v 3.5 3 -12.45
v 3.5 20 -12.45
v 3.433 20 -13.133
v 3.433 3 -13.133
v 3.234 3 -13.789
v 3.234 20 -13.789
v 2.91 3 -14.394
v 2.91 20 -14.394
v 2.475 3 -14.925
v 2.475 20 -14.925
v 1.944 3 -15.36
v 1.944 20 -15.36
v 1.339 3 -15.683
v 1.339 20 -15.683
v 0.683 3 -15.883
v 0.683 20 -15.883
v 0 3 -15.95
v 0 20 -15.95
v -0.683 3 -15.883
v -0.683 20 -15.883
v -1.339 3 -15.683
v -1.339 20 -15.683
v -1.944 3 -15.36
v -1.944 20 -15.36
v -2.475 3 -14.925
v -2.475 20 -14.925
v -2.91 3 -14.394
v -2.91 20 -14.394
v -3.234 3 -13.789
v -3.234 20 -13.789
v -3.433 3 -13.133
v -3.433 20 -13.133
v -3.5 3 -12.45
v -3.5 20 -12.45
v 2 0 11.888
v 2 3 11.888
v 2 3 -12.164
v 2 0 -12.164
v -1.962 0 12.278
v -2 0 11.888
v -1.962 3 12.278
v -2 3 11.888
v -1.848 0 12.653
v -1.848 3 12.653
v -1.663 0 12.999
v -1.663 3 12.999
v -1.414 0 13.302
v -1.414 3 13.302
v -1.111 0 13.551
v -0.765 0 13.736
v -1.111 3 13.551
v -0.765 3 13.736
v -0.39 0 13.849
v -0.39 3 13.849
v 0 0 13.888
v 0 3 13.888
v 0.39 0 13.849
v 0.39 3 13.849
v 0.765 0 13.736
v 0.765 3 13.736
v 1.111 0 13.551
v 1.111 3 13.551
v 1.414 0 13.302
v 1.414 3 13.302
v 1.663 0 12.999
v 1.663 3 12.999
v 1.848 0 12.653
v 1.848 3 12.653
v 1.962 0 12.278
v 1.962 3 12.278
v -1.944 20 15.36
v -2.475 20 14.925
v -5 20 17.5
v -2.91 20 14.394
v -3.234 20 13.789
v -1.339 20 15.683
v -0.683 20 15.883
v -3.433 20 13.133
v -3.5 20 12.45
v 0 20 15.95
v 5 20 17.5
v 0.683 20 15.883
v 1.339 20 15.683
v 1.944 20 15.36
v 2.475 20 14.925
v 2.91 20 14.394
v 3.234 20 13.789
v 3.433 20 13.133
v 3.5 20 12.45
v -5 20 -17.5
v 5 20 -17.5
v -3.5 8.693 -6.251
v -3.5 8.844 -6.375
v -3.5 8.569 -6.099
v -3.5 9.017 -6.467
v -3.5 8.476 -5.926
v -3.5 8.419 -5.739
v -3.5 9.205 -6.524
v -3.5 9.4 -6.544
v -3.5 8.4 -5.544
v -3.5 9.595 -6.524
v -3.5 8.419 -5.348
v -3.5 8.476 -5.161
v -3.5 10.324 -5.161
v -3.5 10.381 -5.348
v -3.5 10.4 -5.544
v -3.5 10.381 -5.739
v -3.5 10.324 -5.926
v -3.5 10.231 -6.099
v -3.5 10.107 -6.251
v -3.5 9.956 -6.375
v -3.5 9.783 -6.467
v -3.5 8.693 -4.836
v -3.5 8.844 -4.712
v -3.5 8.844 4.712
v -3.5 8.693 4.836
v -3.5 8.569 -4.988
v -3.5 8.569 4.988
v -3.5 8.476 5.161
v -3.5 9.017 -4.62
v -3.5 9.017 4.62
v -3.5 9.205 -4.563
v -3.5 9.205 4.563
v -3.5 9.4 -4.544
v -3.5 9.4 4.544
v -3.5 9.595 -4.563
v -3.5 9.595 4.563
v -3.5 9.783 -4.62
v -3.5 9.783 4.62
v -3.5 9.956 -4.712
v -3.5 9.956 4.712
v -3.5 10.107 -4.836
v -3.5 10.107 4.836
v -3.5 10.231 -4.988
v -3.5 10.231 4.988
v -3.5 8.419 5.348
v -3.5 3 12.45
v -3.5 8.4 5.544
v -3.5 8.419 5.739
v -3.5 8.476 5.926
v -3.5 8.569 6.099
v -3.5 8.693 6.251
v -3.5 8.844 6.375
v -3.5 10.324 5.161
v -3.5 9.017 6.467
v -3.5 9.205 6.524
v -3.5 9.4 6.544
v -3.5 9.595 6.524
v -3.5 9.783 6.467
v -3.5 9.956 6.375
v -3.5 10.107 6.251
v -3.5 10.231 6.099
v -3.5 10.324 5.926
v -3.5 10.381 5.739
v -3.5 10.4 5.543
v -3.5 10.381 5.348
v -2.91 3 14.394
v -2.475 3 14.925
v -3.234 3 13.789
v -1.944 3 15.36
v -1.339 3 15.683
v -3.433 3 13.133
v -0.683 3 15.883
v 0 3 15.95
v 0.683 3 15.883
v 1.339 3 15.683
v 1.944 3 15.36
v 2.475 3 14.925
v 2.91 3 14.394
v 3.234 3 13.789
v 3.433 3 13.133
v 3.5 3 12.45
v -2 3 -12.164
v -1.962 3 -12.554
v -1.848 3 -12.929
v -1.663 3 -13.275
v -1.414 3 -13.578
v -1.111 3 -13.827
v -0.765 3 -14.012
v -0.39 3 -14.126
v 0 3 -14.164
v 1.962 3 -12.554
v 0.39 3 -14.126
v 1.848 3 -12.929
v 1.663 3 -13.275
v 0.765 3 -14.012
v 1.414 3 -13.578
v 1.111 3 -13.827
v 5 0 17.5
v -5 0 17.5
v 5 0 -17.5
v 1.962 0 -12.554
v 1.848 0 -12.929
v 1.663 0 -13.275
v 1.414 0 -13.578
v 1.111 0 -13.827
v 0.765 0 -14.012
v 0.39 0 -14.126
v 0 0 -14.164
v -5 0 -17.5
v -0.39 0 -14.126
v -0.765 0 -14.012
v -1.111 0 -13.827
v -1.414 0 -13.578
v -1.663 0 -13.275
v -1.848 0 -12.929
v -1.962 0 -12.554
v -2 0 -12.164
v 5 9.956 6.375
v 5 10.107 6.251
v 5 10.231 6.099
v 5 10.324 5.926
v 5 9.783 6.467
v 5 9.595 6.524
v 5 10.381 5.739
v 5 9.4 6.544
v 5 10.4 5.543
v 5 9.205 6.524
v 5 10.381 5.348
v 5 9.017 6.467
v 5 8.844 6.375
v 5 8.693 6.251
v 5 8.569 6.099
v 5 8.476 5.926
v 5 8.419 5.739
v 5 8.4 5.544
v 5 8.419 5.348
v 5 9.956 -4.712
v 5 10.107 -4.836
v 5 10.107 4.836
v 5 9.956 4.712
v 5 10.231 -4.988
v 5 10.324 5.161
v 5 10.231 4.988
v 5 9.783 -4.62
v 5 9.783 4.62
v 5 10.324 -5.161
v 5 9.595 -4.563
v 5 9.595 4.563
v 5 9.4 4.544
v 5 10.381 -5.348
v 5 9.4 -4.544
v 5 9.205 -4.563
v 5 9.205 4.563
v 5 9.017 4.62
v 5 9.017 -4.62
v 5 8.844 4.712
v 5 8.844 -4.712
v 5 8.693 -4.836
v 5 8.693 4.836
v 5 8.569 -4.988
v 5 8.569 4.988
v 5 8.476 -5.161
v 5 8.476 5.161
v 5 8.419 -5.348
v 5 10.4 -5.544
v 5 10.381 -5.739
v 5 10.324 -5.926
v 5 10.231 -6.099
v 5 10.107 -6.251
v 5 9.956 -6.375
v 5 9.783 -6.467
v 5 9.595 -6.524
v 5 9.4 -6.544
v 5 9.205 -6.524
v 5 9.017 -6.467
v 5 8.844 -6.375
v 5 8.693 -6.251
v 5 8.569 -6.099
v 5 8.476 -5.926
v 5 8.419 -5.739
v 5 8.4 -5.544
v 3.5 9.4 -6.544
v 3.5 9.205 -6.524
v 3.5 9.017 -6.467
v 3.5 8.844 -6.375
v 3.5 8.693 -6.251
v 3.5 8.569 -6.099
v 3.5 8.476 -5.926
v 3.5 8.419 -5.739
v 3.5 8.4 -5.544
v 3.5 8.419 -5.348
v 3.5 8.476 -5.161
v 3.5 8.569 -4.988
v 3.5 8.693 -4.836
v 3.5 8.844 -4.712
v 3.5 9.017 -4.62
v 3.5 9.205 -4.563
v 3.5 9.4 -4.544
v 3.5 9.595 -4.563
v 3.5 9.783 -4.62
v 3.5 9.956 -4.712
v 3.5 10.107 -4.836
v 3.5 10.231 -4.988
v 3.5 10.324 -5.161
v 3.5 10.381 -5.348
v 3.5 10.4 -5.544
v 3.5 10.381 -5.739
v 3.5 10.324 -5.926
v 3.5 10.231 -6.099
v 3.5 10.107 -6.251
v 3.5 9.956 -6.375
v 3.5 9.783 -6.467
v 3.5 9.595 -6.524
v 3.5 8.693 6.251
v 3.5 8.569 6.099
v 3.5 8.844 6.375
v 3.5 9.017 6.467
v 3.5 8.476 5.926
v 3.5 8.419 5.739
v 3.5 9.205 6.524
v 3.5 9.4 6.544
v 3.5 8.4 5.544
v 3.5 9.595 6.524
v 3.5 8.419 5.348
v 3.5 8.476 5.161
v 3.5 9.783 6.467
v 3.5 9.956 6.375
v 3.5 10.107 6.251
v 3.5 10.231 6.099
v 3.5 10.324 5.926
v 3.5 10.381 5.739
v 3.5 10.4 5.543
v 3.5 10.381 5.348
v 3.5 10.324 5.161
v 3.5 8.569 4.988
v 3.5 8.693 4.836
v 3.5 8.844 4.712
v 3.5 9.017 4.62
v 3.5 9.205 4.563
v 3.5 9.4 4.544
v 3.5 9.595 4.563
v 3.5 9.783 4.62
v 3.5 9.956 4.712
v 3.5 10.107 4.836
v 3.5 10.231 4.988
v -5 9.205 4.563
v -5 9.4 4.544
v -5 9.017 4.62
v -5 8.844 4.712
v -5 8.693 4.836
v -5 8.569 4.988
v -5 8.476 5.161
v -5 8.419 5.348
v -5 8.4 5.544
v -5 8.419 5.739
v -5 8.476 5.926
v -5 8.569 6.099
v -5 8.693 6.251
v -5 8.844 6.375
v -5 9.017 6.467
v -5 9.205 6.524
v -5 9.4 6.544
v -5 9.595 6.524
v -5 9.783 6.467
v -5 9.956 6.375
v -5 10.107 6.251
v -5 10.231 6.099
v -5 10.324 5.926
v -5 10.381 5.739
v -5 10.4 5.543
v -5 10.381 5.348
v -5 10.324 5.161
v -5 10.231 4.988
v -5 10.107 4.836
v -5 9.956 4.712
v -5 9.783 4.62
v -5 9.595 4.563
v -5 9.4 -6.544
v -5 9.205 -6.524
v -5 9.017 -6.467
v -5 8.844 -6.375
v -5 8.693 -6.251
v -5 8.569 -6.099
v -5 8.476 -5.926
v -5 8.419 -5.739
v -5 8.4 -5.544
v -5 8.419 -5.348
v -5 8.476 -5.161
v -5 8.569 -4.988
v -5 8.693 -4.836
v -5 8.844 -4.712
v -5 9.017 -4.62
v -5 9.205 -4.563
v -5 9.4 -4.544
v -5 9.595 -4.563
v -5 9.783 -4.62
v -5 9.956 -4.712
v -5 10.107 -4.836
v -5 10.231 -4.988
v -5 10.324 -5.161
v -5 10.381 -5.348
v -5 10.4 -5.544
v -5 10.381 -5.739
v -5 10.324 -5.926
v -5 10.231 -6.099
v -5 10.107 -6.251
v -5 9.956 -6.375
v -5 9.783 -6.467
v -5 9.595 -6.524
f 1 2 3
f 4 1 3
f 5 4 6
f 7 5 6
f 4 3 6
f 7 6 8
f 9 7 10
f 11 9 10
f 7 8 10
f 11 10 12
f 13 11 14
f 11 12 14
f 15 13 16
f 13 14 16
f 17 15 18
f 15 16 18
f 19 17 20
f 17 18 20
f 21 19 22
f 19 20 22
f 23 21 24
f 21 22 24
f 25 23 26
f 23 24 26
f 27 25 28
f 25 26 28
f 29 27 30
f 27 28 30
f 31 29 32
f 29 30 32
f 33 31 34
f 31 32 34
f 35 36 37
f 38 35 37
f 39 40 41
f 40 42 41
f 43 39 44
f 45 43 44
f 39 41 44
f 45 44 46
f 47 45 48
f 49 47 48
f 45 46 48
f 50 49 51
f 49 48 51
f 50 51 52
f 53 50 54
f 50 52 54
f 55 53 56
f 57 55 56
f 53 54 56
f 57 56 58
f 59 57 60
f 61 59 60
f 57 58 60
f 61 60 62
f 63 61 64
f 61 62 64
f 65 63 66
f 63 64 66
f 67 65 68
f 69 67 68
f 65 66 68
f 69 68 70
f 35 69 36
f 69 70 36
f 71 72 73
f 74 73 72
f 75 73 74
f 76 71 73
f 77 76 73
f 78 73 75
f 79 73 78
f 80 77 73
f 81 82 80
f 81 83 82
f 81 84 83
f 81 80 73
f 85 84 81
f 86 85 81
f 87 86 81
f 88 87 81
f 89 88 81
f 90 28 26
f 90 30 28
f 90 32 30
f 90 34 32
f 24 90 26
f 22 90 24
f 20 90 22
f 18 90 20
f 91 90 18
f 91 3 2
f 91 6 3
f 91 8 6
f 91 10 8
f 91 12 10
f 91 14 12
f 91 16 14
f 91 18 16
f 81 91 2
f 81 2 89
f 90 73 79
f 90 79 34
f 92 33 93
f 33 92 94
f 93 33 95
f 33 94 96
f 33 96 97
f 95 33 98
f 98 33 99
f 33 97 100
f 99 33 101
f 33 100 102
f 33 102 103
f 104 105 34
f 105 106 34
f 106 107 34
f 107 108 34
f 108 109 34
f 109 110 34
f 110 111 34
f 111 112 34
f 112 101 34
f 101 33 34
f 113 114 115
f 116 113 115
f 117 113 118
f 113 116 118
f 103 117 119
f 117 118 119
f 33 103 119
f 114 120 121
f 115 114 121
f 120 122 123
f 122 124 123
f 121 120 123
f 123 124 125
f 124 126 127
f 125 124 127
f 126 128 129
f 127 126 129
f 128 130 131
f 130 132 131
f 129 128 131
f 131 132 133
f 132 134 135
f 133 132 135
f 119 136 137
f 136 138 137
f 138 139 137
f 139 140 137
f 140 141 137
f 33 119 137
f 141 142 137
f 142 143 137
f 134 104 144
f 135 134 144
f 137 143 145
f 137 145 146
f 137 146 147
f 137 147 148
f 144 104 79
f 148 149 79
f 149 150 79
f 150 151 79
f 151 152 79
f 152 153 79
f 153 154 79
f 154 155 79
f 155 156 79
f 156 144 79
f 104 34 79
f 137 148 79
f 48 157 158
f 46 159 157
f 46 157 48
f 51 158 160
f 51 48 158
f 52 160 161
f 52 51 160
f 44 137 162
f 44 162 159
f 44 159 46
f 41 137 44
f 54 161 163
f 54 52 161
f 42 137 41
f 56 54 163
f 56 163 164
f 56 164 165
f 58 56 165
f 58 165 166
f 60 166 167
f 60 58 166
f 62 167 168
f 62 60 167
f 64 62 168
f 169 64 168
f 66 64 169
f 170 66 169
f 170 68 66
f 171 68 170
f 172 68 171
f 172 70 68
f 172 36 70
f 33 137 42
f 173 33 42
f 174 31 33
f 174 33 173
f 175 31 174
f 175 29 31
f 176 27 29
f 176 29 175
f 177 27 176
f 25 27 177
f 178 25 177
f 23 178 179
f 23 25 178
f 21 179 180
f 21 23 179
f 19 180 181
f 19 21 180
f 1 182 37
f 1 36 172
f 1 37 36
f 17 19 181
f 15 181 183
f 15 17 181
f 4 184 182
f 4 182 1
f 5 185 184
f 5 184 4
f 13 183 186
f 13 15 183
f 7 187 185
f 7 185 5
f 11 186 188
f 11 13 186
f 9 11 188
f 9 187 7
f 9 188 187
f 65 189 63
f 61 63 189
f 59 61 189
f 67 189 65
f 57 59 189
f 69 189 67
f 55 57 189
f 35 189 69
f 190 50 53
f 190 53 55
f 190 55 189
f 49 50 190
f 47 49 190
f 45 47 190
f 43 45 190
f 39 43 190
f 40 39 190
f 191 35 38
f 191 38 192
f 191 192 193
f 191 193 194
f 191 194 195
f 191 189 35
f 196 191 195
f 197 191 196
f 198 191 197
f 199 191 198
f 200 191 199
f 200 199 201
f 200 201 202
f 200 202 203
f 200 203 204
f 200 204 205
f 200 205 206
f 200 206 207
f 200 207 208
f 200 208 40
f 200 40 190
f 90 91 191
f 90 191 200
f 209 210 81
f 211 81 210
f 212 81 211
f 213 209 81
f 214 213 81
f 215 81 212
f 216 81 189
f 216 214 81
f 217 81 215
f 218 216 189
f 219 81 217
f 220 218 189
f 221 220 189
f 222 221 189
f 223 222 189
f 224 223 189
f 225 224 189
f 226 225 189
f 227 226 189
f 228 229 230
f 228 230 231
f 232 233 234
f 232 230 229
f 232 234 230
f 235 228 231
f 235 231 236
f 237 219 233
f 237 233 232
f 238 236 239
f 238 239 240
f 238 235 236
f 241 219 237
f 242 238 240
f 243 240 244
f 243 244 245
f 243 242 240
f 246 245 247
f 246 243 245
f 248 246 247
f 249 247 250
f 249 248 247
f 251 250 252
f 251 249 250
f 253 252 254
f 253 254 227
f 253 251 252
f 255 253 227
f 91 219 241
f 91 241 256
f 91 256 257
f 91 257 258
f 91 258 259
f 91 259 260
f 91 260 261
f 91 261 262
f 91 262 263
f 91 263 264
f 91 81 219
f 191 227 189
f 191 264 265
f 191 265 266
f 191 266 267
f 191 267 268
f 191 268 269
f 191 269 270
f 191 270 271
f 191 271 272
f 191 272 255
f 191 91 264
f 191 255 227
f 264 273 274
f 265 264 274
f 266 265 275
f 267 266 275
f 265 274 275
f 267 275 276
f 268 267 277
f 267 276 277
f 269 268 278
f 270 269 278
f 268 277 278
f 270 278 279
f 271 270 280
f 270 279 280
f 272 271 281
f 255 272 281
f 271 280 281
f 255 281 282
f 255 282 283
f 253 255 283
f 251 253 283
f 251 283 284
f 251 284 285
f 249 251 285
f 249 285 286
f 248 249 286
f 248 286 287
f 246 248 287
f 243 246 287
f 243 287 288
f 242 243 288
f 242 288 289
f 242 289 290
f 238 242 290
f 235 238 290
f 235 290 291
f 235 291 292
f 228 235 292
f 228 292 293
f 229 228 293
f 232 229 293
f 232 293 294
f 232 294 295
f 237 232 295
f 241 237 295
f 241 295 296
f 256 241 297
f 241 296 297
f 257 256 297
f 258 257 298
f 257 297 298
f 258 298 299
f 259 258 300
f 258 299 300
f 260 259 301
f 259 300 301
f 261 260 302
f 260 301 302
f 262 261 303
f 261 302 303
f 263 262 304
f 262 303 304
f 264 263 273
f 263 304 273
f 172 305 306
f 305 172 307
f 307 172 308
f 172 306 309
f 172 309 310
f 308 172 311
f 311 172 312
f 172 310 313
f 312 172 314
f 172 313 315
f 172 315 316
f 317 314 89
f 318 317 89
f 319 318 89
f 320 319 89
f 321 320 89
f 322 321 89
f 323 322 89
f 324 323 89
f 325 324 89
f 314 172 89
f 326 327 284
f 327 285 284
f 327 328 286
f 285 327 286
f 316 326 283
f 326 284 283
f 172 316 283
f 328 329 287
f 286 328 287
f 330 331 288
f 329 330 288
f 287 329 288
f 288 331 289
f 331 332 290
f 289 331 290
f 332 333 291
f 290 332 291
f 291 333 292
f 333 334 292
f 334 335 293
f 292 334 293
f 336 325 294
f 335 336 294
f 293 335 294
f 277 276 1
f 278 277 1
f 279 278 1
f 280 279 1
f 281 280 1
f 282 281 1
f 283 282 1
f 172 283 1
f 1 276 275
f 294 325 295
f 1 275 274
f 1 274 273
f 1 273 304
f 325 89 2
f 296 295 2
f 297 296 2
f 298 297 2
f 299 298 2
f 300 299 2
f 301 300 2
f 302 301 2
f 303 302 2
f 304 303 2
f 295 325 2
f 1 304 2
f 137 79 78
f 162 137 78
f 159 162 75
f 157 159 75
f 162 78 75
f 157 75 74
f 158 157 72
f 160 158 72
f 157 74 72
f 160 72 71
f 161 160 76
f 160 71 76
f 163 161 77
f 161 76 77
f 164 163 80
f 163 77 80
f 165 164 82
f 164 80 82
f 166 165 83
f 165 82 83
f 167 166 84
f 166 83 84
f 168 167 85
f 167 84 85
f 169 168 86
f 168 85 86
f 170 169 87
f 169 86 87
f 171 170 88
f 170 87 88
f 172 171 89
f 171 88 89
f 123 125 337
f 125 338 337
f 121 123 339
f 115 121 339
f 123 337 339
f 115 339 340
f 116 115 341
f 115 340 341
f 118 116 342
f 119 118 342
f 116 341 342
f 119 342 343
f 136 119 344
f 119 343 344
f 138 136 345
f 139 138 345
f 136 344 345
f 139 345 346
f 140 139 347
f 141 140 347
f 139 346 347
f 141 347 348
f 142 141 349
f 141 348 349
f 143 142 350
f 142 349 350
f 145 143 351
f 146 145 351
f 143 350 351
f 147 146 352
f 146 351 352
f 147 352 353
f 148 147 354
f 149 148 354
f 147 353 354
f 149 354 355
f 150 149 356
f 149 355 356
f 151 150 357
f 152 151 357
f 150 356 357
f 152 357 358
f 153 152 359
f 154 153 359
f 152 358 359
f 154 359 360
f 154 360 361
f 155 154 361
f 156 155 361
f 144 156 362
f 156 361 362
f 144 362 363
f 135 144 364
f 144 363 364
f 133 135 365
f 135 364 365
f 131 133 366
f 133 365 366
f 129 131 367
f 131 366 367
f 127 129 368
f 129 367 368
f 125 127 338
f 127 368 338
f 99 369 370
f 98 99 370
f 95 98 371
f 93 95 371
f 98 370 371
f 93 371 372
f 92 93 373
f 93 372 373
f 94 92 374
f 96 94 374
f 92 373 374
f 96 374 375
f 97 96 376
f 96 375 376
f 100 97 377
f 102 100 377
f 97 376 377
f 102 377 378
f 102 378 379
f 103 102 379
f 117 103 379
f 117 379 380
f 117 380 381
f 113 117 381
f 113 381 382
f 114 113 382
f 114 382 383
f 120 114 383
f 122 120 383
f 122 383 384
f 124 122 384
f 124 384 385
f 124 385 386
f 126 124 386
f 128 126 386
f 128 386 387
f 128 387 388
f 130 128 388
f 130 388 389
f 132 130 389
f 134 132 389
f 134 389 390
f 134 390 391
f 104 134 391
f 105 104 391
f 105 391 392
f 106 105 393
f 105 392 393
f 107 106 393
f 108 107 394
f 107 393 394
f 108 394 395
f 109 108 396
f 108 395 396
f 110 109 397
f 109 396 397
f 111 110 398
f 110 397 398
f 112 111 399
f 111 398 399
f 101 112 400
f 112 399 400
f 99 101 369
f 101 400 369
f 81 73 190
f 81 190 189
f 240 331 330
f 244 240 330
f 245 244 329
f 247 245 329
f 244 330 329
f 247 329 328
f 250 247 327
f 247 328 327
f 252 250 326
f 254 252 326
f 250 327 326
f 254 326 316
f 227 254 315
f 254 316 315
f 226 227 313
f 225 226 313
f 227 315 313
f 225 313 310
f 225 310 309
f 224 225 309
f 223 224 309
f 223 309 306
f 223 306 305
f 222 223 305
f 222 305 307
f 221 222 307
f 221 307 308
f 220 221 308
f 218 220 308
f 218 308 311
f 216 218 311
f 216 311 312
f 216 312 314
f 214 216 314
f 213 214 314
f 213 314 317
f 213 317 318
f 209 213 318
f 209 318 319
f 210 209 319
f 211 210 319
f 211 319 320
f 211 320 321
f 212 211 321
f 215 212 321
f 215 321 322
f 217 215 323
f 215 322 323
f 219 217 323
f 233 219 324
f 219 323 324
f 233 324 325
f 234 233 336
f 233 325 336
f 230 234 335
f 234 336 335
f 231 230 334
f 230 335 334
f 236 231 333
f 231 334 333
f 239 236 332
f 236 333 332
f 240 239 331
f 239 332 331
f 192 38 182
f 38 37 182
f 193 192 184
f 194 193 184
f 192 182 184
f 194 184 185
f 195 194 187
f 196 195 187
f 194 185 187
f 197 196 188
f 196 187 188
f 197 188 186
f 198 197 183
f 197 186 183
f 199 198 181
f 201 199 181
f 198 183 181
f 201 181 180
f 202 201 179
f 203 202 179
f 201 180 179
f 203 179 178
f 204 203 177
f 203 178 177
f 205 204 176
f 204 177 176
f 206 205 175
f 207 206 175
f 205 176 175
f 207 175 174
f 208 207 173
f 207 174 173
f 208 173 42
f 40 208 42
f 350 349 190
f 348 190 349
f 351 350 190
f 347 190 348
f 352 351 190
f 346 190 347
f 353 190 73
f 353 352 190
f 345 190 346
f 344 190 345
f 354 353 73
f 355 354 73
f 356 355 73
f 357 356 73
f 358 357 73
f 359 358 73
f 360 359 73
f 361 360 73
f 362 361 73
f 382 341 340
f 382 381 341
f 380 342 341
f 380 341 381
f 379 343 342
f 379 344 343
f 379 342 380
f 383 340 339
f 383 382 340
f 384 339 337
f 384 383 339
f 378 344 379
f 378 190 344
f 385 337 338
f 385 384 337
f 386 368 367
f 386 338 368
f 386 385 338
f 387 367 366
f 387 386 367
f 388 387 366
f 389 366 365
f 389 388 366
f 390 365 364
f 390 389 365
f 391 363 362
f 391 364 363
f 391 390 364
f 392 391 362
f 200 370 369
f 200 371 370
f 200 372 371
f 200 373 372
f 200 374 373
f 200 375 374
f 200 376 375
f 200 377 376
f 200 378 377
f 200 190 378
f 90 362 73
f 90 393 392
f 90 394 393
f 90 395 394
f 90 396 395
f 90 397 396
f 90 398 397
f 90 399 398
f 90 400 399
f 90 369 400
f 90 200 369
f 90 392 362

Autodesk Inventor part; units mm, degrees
ref_plane "YZ Plane" through (0, 0, 0) normal (1, 0, 0) x (0, 1, 0)
ref_plane "XZ Plane" through (0, 0, 0) normal (0, 1, 0) x (-1, 0, 0)
ref_plane "XY Plane" through (0, 0, 0) normal (0, 0, 1) x (1, 0, 0)
sketch "Sketch1" plane through (0, 0, 0) normal (0, 1, 0) x (-1, 0, 0)
  line L0 (5, -12.5) -> (-5, -12.5)
  line L1 (-5, -12.5) -> (-5, 12.5)
  line L2 (-5, 12.5) -> (5, 12.5)
  line L3 (5, 12.5) -> (5, -12.5)
  line L4 (5, -12.5) -> (-5, 12.5) construction
  line L5 (-5, -12.5) -> (5, 12.5) construction
  point P0 (0, 0)
  dimension "d0" = 10
  dimension "d1" = 25
extrude "Extrusion1" add sketch "Sketch1" along normal blind 20
sketch "Sketch2" plane through (5, 0, 12.5) normal (1, 0, 0) x (0, 0, -1)
  line L0 (0, 0) -> (25, 0) projected
  line L1 (0, 0) -> (0, 20) projected
  point P0 (12.5, 0)
  point P1 (6.9565, 9.4)
  point P2 (18.0435, 9.4)
  dimension "d11" = 9.4
  dimension "d12" = 9.4
  dimension "d13" = 11.087
  dimension "d14" = 6.9565
hole "Hole1" at (5, 9.4, 5.5435) at (5, 9.4, -5.5435) direction (-1, 0, 0) diameter 2 depth 25
sketch "Sketch3" plane through (5, 0, -12.5) normal (0, 0, -1) x (-1, 0, 0)
  line L0 (0, 0) -> (0, 20) projected
  line L1 (10, 0) -> (10, 20) projected
  line L2 (0, 20) -> (10, 20)
  line L3 (10, 20) -> (10, 0)
  line L4 (10, 0) -> (0, 0)
  line L5 (0, 0) -> (0, 20)
  point P0 (5, 0)
extrude "Extrusion2" add sketch "Sketch3" along normal blind 5
sketch "Sketch4" plane through (-5, 0, 12.5) normal (0, 0, 1) x (1, 0, 0)
  line L0 (0, 0) -> (0, 20) projected
  line L1 (10, 0) -> (0, 0)
  line L2 (0, 0) -> (0, 20)
  line L3 (0, 20) -> (10, 20)
  line L4 (10, 20) -> (10, 0)
  point P0 (5, 0)
extrude "Extrusion3" add sketch "Sketch4" along normal blind 5
sketch "Sketch5" plane through (0, 20, 0) normal (0, 1, 0) x (1, 0, 0)
  line L0 (0, -15.9498) -> (0, 15.9498) construction
  line L1 (3.5, -12.4498) -> (3.5, 12.4498)
  line L2 (-3.5, 12.4498) -> (-3.5, -12.4498)
  arc A0 (-3.5, -12.4498) -> (3.5, -12.4498) centre (0, -12.4498) ccw
  arc A1 (3.5, 12.4498) -> (-3.5, 12.4498) centre (0, 12.4498) ccw
  point P0 (0, 0)
  point P1 (0, 0)
  dimension "d19" = 7
extrude "Extrusion4" cut sketch "Sketch5" against normal blind 17
sketch "Sketch6" plane through (0, 3, 0) normal (0, 1, 0) x (1, 0, 0)
  line L0 (0, -13.8879) -> (0, 14.164) construction
  line L1 (2, -11.8879) -> (2, 12.164)
  line L2 (-2, 12.164) -> (-2, -11.8879)
  arc A0 (-2, -11.8879) -> (2, -11.8879) centre (0, -11.8879) ccw
  arc A1 (2, 12.164) -> (-2, 12.164) centre (0, 12.164) ccw
  point P0 (0, 0)
  point P1 (0, 0.1381)
  dimension "d22" = 4
extrude "Extrusion5" cut sketch "Sketch6" against normal blind 15
properties part number "ResonantSlider"
